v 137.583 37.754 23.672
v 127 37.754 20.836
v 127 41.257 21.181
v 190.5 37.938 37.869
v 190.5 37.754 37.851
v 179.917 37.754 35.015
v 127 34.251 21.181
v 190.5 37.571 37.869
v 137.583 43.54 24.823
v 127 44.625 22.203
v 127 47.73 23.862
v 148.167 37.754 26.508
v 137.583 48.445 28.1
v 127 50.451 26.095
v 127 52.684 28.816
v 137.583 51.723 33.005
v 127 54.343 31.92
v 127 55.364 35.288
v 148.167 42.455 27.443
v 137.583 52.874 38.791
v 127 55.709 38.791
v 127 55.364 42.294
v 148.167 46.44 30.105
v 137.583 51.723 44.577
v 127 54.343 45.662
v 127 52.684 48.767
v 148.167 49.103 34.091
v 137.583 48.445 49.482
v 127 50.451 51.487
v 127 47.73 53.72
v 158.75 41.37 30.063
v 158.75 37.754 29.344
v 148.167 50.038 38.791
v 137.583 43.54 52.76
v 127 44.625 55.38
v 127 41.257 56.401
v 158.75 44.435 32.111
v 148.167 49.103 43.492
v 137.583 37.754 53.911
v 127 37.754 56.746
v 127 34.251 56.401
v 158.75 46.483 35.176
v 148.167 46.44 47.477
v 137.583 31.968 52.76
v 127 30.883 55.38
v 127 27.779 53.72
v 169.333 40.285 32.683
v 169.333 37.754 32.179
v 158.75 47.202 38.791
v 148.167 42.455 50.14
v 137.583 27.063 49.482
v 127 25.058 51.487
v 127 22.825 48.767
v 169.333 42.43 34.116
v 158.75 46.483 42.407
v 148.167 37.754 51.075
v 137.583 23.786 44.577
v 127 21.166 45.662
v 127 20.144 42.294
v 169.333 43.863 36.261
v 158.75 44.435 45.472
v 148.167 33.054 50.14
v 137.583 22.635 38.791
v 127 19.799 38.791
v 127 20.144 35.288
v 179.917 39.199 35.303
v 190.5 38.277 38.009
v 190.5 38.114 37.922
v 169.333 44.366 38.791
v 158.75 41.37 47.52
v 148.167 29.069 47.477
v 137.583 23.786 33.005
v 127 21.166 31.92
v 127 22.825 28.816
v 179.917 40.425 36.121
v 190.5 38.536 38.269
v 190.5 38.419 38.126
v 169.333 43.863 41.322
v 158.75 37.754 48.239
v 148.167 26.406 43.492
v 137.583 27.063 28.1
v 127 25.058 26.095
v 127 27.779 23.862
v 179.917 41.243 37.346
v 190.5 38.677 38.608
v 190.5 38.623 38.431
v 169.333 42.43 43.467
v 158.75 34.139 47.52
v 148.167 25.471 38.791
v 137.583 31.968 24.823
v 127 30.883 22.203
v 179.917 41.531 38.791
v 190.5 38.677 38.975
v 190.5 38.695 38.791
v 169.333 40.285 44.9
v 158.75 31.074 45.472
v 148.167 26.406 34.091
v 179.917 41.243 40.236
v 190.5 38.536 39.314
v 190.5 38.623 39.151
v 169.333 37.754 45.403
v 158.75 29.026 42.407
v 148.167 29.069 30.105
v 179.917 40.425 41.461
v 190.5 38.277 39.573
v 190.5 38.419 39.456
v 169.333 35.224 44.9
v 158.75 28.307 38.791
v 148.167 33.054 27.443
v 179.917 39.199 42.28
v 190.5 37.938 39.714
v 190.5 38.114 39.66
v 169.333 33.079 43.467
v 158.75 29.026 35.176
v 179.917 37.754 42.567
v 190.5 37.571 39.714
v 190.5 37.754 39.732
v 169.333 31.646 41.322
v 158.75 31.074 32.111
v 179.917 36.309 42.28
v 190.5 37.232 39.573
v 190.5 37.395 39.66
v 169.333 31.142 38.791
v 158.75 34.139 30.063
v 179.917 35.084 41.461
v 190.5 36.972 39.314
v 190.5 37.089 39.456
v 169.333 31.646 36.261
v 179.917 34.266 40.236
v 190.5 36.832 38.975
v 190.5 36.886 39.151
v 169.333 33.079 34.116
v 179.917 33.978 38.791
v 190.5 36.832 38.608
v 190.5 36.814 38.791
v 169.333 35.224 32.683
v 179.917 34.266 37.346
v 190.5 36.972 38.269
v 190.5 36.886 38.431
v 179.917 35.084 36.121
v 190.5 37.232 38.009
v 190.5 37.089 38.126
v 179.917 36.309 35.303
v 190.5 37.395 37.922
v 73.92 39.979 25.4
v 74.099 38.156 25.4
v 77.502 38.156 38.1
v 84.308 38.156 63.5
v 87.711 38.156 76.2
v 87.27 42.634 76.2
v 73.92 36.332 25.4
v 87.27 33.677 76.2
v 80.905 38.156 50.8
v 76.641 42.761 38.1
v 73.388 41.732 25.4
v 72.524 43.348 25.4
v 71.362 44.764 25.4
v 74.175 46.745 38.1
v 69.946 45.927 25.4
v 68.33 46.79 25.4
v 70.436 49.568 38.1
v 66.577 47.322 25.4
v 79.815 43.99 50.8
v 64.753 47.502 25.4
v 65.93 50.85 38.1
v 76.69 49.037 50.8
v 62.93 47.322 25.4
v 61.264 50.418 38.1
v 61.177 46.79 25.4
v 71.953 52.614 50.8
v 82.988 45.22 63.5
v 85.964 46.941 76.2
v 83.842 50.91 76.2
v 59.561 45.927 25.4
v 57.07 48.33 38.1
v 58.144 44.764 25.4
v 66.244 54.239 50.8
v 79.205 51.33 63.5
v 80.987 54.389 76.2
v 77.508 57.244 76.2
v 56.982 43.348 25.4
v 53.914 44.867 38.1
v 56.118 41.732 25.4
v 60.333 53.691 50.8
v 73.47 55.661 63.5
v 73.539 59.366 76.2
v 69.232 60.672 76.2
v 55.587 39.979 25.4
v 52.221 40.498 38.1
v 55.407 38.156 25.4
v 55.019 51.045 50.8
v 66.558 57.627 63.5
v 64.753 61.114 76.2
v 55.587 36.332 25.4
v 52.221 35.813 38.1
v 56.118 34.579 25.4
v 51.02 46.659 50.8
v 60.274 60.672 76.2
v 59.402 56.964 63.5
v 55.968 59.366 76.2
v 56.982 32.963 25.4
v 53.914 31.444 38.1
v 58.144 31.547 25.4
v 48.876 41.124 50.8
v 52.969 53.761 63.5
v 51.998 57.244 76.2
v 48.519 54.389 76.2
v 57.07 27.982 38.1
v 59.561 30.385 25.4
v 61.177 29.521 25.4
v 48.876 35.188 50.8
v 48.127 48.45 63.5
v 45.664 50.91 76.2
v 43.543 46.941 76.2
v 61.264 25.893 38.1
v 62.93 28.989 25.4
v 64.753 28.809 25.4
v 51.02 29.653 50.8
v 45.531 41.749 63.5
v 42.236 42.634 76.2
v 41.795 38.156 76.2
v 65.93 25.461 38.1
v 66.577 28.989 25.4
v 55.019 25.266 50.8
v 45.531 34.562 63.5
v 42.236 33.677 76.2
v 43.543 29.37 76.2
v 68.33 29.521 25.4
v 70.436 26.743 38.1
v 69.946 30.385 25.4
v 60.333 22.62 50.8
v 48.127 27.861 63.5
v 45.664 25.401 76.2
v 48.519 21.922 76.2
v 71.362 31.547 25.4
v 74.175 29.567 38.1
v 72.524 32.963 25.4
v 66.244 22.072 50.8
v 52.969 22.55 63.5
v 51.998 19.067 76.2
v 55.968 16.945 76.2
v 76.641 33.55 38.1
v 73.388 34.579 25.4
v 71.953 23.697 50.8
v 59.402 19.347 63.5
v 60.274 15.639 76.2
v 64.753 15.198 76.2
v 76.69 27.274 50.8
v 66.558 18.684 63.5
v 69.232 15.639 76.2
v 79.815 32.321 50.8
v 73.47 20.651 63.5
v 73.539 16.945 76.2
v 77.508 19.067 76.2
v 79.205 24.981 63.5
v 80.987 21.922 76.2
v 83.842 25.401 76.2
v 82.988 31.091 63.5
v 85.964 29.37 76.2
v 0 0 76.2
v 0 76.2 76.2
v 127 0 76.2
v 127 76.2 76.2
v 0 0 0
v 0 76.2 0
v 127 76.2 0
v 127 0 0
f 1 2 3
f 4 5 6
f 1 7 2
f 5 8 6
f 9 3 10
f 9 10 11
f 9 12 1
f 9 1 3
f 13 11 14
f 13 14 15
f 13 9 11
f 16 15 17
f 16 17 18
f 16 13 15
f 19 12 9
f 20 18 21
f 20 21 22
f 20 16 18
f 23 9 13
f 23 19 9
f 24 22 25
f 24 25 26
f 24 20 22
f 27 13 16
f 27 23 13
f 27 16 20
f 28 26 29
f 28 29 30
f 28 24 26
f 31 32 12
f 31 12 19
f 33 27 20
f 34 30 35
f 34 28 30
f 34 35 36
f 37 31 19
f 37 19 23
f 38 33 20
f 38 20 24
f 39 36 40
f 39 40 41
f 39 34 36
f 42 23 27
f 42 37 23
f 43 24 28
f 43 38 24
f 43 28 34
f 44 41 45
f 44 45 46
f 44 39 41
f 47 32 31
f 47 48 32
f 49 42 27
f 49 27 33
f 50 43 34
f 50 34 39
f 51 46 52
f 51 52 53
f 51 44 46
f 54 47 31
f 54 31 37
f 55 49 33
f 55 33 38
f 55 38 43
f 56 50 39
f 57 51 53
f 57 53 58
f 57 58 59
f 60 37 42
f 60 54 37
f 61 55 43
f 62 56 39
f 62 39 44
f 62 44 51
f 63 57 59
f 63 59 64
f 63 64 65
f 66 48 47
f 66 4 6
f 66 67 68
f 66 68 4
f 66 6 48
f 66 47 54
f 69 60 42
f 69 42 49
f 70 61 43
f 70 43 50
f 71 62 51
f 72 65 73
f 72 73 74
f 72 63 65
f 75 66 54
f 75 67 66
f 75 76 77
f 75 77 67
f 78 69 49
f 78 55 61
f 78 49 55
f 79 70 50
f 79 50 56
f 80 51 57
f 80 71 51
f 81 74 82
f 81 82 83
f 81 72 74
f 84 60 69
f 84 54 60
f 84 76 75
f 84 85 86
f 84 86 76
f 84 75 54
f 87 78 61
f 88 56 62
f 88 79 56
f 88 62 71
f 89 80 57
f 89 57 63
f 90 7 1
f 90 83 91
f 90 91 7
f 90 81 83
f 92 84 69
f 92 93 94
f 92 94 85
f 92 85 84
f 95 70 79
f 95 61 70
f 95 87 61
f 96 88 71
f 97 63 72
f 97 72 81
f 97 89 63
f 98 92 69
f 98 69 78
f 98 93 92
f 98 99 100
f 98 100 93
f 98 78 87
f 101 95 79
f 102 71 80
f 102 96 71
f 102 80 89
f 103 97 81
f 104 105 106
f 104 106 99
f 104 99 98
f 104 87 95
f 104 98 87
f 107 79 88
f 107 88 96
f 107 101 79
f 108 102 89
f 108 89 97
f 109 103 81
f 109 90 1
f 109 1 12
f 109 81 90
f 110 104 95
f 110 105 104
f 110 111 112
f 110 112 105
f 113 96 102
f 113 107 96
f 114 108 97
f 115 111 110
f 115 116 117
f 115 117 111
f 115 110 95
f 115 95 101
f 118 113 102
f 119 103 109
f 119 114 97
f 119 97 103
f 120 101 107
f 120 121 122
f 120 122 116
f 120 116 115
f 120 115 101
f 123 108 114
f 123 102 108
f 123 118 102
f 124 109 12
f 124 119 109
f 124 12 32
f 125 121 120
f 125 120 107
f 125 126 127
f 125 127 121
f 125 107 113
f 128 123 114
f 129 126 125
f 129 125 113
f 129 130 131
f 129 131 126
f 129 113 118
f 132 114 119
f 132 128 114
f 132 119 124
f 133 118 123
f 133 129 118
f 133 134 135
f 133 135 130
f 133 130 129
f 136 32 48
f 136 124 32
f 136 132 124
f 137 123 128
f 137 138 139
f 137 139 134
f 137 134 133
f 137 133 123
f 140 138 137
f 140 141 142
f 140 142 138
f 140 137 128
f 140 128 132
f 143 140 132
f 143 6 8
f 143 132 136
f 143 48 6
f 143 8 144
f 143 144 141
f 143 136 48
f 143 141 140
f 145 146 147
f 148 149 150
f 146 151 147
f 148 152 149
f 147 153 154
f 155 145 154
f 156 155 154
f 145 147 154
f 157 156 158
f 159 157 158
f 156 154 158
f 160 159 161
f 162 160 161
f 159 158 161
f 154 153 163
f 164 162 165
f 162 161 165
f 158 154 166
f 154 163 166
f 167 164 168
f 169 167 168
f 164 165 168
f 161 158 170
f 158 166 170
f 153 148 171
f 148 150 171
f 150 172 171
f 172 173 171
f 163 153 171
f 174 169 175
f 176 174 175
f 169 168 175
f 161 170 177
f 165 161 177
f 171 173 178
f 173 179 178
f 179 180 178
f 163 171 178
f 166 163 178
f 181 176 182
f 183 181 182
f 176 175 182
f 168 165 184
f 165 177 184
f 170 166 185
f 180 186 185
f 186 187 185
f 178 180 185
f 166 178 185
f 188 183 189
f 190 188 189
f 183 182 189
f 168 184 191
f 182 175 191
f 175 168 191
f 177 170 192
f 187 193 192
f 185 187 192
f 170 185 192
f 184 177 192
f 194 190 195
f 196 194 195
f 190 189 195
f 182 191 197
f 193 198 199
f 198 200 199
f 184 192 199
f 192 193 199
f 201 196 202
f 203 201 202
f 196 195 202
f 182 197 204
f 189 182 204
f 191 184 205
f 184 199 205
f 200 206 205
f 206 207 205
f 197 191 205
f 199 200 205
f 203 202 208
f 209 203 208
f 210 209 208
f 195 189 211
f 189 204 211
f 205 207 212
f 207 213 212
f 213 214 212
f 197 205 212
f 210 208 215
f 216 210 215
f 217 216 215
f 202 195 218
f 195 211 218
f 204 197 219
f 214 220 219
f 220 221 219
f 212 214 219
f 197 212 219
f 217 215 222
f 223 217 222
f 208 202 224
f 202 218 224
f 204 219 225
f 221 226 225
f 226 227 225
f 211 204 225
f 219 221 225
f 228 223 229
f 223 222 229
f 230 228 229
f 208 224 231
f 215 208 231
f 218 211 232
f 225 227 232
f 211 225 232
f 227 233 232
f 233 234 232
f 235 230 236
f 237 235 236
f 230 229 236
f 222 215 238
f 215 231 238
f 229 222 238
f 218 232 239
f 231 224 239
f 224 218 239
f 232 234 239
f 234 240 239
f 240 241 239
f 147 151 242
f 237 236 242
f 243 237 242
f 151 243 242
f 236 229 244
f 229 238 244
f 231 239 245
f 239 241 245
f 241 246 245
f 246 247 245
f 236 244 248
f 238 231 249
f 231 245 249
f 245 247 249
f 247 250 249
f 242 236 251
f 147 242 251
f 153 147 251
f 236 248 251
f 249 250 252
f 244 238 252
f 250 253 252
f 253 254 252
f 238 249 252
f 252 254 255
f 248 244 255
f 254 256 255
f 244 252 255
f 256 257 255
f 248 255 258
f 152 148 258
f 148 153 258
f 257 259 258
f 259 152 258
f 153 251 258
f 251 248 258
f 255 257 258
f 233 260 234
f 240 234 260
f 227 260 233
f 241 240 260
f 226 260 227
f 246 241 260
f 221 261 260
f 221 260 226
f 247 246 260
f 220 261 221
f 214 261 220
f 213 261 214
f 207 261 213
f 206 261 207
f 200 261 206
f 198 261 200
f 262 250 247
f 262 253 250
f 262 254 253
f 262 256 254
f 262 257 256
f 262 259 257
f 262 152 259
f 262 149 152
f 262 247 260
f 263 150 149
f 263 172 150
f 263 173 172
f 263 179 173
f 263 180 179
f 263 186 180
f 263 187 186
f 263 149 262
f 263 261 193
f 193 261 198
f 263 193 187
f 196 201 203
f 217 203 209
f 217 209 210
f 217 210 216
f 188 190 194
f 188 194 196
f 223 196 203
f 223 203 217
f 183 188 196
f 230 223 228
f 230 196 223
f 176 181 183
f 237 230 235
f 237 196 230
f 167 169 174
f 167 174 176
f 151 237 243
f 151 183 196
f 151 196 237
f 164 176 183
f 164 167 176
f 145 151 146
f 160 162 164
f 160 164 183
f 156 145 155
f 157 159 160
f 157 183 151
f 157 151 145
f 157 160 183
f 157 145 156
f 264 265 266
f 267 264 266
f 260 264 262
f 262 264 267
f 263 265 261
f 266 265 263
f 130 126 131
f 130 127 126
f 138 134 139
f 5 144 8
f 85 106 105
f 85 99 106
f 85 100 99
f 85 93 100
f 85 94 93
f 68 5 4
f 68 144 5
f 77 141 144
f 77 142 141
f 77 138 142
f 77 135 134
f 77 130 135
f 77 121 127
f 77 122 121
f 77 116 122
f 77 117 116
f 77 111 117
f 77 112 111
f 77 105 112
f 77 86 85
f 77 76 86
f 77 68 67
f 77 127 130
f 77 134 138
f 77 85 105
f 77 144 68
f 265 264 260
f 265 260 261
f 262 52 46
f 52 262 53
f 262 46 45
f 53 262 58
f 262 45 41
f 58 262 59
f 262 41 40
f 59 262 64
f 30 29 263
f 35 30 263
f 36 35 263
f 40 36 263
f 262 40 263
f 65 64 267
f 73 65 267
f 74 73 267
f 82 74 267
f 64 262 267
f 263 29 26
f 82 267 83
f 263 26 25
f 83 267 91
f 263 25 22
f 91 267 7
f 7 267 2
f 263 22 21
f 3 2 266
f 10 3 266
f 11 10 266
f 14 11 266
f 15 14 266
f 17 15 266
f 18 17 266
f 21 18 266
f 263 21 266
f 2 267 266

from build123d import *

# Parameters (mm, degrees)
SKETCH1_W           = 127
SKETCH1_H           = 76.2
BOSS_EXTRUDE1_DEPTH = 76.2
SKETCH2_R           = 22.957981207
CUT_EXTRUDE1_DEPTH  = 50.8
CUT_EXTRUDE1_DRAFT  = -15
SKETCH3_R           = 17.955133558
BOSS_EXTRUDE2_DEPTH = 63.5
BOSS_EXTRUDE2_TAPER = 15


with BuildPart() as part:
    # Sketch1 → Boss-Extrude1 (new body)
    with BuildSketch(Plane.XY):
        with Locations((63.5, 38.1)):
            Rectangle(SKETCH1_W, SKETCH1_H)
    extrude(amount=BOSS_EXTRUDE1_DEPTH)


with BuildPart() as cut_extrude1_tool:
    # Sketch2 → Cut-Extrude1 (with draft: the straight prism first)
    with BuildSketch(Plane.XY.offset(76.2)):
        with Locations((64.753202194, 38.155586657)):
            Circle(SKETCH2_R)
    extrude(amount=-CUT_EXTRUDE1_DEPTH)
    # Cut-Extrude1: the draft: its side faces are tilted about the plane it starts from
    cut_extrude1_sides = [cut_extrude1_tool.faces().sort_by_distance(p)[0] for p in [
        (41.795220987, 38.155586657, 50.8),
    ]]
    draft(cut_extrude1_sides, Plane.XY.offset(76.2), CUT_EXTRUDE1_DRAFT)


with BuildPart() as part_1:
    add(part.part)

    # Cut-Extrude1: cut by cut_extrude1_tool
    add(cut_extrude1_tool.part, mode=Mode.SUBTRACT)

    # Sketch3 → Boss-Extrude2 (add)
    with BuildSketch(Plane(origin=(127, 0, 0), x_dir=(0, 0, -1), z_dir=(1, 0, 0))):
        with Locations((-38.791271087, 37.754364457)):
            Circle(SKETCH3_R)
    extrude(amount=BOSS_EXTRUDE2_DEPTH, taper=BOSS_EXTRUDE2_TAPER)


solid = part_1.part
